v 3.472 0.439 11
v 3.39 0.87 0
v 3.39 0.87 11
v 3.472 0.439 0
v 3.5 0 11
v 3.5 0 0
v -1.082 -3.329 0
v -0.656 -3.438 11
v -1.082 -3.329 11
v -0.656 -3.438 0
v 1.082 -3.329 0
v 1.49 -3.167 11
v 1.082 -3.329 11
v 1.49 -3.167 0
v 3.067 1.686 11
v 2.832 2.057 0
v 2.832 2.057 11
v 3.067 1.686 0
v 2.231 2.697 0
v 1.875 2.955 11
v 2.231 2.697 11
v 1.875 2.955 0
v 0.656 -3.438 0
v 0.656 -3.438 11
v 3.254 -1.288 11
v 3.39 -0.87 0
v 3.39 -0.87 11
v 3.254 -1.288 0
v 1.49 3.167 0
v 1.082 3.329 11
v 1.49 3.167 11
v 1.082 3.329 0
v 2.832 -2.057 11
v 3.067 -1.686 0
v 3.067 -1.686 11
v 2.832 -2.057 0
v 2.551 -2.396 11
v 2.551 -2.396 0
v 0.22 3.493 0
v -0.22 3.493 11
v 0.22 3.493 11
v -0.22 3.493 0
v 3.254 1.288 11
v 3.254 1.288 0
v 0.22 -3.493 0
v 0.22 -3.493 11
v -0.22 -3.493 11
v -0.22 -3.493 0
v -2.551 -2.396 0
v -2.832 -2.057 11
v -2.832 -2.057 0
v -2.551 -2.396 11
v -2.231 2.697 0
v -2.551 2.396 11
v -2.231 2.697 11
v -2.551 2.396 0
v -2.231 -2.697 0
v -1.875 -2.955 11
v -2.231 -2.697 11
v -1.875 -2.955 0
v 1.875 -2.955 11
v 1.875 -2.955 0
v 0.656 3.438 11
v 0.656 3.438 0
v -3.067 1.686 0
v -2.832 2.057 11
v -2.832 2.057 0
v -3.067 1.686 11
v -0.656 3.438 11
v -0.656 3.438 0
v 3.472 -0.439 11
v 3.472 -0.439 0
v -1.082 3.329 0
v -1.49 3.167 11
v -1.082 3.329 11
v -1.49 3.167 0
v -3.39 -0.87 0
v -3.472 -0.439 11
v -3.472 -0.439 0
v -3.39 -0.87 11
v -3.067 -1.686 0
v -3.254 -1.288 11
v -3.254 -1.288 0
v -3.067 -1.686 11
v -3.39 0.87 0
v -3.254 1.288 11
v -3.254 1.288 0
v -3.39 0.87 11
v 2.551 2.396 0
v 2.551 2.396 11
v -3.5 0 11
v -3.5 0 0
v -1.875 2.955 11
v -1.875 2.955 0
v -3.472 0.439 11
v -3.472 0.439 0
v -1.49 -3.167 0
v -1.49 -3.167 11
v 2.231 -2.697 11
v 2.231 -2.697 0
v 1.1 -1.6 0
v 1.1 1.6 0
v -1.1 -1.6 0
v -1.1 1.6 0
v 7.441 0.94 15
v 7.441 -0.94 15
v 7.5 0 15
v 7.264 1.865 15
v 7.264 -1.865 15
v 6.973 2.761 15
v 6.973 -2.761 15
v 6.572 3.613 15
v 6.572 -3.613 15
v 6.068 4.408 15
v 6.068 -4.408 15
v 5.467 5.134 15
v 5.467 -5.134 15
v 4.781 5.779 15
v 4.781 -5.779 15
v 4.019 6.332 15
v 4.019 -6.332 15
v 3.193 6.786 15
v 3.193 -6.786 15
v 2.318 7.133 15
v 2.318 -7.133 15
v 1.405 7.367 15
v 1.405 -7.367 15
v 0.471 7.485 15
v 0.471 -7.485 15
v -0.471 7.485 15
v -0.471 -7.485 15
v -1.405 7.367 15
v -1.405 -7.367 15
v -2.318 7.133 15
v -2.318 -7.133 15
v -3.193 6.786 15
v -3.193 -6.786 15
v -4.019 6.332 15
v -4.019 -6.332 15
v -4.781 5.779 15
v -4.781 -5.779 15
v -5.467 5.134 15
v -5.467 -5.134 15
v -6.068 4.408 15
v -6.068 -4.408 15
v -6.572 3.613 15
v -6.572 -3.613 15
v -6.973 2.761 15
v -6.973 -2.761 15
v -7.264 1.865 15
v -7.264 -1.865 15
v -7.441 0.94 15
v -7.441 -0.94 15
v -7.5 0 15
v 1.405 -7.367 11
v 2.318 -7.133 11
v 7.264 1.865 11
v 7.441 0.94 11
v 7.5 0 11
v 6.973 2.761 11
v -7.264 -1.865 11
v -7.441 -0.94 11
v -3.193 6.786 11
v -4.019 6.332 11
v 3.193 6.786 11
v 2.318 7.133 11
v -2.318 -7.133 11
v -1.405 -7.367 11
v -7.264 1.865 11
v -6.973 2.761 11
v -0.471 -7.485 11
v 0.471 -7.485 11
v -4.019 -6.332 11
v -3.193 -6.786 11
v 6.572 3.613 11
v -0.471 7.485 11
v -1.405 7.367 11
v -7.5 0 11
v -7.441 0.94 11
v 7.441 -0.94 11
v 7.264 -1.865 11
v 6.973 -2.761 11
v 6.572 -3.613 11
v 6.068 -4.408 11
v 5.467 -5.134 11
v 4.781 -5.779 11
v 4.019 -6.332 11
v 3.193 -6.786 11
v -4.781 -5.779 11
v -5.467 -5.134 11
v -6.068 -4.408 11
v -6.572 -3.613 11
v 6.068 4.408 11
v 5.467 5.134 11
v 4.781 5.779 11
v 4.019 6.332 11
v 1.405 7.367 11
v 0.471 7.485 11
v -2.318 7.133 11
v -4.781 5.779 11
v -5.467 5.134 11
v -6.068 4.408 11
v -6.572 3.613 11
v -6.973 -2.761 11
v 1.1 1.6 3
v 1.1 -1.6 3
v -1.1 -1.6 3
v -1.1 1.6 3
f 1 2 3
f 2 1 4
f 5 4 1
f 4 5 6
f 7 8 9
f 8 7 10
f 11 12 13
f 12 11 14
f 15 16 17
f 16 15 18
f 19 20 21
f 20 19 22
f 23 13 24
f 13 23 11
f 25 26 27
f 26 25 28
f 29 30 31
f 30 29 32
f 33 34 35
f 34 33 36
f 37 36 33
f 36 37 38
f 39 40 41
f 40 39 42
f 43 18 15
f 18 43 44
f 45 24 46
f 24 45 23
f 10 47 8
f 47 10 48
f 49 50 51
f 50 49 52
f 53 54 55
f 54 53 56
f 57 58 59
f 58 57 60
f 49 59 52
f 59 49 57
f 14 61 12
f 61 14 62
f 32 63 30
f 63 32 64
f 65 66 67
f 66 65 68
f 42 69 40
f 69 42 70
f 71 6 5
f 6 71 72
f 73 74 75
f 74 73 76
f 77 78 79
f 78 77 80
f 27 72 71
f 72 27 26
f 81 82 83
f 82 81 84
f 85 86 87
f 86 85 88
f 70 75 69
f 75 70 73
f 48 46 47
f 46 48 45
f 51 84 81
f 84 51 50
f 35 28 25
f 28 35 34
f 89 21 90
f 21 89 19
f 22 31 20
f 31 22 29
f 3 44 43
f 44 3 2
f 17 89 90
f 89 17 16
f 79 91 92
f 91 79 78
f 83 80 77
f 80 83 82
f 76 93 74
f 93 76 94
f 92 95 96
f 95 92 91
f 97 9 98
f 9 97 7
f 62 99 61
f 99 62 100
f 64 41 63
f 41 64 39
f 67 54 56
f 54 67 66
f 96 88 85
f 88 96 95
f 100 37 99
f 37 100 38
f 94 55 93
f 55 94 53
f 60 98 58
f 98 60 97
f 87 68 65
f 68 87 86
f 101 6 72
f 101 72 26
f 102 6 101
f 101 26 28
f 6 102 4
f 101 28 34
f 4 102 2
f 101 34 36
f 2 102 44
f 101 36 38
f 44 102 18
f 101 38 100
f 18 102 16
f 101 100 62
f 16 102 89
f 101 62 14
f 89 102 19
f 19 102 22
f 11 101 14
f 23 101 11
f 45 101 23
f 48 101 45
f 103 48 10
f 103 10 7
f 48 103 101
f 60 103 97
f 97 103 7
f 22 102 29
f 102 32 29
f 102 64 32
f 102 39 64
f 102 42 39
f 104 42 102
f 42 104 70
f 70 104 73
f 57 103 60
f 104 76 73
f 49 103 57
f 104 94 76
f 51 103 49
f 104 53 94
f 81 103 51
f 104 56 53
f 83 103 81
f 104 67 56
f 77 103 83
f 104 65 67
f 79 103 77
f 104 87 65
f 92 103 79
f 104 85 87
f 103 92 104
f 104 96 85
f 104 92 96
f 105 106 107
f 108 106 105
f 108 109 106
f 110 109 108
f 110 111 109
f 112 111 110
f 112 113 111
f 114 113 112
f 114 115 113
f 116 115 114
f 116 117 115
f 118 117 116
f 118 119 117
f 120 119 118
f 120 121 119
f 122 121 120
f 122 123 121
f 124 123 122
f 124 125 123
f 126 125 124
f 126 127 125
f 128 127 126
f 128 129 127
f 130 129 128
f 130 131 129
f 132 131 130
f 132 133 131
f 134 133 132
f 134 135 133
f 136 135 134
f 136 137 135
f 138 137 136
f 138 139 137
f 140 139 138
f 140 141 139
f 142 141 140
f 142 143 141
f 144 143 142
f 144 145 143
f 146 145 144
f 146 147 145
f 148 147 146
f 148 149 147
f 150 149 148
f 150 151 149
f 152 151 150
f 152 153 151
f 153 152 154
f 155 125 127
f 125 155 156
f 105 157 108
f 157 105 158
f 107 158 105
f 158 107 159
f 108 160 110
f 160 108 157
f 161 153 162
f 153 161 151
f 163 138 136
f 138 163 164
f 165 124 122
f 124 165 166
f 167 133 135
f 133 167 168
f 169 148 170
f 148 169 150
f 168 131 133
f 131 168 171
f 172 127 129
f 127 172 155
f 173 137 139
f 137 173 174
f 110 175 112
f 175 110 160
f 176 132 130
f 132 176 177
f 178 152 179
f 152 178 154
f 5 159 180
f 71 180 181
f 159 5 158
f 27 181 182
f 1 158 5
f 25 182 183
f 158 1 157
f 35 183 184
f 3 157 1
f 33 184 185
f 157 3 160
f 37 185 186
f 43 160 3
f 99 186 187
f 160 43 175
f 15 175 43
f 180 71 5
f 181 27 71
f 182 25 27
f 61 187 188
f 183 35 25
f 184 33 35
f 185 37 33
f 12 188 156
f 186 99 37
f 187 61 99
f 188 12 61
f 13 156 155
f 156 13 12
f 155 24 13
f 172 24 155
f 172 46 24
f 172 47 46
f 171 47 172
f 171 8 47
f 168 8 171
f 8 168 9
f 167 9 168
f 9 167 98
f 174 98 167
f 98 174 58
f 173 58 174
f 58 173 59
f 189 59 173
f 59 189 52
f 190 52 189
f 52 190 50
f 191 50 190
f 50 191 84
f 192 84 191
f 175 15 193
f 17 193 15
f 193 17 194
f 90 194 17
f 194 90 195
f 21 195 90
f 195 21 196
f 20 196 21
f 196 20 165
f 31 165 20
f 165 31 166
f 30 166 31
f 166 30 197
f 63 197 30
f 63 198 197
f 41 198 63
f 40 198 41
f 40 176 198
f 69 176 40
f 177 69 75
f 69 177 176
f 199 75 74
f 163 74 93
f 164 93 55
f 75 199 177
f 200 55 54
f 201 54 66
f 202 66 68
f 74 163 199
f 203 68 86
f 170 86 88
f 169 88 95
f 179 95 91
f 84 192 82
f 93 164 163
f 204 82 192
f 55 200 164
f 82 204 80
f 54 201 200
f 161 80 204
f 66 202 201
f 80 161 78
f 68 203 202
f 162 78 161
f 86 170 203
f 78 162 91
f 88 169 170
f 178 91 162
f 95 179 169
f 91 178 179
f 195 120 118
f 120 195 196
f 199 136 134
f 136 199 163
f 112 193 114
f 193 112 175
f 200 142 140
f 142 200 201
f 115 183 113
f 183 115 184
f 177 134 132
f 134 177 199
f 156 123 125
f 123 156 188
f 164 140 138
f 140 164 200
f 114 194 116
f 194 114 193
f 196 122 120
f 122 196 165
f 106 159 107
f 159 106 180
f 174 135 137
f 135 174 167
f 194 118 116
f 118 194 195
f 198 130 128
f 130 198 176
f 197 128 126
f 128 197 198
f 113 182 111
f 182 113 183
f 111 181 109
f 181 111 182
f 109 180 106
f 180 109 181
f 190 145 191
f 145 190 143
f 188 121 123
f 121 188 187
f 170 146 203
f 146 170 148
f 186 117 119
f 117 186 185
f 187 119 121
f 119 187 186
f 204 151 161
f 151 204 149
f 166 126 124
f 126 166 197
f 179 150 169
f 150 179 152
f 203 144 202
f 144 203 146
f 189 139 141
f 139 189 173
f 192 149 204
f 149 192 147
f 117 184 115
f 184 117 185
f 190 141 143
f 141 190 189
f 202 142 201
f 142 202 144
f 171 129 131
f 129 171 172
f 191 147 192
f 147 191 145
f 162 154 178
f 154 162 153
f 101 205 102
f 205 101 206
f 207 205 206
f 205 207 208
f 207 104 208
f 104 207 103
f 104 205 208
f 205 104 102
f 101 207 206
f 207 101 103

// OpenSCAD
DIAMETER = 7;
HEIGHT = 15;
CAP_DIAMETER = 15;
CAP_HEIGHT = 4;
MOUNT_WIDTH = 2.2;
MOUNT_LENGTH = 3.2;
MOUNT_HEIGHT = 3;

$fn = 50;

difference() {
    union() {
        cylinder(d = DIAMETER, h = HEIGHT);
        translate([0, 0, HEIGHT-CAP_HEIGHT])
        cylinder(d = CAP_DIAMETER, h = CAP_HEIGHT);
    }
    translate([-MOUNT_WIDTH/2, -MOUNT_LENGTH/2, 0])
    cube(size = [MOUNT_WIDTH, MOUNT_LENGTH, MOUNT_HEIGHT]);
}
